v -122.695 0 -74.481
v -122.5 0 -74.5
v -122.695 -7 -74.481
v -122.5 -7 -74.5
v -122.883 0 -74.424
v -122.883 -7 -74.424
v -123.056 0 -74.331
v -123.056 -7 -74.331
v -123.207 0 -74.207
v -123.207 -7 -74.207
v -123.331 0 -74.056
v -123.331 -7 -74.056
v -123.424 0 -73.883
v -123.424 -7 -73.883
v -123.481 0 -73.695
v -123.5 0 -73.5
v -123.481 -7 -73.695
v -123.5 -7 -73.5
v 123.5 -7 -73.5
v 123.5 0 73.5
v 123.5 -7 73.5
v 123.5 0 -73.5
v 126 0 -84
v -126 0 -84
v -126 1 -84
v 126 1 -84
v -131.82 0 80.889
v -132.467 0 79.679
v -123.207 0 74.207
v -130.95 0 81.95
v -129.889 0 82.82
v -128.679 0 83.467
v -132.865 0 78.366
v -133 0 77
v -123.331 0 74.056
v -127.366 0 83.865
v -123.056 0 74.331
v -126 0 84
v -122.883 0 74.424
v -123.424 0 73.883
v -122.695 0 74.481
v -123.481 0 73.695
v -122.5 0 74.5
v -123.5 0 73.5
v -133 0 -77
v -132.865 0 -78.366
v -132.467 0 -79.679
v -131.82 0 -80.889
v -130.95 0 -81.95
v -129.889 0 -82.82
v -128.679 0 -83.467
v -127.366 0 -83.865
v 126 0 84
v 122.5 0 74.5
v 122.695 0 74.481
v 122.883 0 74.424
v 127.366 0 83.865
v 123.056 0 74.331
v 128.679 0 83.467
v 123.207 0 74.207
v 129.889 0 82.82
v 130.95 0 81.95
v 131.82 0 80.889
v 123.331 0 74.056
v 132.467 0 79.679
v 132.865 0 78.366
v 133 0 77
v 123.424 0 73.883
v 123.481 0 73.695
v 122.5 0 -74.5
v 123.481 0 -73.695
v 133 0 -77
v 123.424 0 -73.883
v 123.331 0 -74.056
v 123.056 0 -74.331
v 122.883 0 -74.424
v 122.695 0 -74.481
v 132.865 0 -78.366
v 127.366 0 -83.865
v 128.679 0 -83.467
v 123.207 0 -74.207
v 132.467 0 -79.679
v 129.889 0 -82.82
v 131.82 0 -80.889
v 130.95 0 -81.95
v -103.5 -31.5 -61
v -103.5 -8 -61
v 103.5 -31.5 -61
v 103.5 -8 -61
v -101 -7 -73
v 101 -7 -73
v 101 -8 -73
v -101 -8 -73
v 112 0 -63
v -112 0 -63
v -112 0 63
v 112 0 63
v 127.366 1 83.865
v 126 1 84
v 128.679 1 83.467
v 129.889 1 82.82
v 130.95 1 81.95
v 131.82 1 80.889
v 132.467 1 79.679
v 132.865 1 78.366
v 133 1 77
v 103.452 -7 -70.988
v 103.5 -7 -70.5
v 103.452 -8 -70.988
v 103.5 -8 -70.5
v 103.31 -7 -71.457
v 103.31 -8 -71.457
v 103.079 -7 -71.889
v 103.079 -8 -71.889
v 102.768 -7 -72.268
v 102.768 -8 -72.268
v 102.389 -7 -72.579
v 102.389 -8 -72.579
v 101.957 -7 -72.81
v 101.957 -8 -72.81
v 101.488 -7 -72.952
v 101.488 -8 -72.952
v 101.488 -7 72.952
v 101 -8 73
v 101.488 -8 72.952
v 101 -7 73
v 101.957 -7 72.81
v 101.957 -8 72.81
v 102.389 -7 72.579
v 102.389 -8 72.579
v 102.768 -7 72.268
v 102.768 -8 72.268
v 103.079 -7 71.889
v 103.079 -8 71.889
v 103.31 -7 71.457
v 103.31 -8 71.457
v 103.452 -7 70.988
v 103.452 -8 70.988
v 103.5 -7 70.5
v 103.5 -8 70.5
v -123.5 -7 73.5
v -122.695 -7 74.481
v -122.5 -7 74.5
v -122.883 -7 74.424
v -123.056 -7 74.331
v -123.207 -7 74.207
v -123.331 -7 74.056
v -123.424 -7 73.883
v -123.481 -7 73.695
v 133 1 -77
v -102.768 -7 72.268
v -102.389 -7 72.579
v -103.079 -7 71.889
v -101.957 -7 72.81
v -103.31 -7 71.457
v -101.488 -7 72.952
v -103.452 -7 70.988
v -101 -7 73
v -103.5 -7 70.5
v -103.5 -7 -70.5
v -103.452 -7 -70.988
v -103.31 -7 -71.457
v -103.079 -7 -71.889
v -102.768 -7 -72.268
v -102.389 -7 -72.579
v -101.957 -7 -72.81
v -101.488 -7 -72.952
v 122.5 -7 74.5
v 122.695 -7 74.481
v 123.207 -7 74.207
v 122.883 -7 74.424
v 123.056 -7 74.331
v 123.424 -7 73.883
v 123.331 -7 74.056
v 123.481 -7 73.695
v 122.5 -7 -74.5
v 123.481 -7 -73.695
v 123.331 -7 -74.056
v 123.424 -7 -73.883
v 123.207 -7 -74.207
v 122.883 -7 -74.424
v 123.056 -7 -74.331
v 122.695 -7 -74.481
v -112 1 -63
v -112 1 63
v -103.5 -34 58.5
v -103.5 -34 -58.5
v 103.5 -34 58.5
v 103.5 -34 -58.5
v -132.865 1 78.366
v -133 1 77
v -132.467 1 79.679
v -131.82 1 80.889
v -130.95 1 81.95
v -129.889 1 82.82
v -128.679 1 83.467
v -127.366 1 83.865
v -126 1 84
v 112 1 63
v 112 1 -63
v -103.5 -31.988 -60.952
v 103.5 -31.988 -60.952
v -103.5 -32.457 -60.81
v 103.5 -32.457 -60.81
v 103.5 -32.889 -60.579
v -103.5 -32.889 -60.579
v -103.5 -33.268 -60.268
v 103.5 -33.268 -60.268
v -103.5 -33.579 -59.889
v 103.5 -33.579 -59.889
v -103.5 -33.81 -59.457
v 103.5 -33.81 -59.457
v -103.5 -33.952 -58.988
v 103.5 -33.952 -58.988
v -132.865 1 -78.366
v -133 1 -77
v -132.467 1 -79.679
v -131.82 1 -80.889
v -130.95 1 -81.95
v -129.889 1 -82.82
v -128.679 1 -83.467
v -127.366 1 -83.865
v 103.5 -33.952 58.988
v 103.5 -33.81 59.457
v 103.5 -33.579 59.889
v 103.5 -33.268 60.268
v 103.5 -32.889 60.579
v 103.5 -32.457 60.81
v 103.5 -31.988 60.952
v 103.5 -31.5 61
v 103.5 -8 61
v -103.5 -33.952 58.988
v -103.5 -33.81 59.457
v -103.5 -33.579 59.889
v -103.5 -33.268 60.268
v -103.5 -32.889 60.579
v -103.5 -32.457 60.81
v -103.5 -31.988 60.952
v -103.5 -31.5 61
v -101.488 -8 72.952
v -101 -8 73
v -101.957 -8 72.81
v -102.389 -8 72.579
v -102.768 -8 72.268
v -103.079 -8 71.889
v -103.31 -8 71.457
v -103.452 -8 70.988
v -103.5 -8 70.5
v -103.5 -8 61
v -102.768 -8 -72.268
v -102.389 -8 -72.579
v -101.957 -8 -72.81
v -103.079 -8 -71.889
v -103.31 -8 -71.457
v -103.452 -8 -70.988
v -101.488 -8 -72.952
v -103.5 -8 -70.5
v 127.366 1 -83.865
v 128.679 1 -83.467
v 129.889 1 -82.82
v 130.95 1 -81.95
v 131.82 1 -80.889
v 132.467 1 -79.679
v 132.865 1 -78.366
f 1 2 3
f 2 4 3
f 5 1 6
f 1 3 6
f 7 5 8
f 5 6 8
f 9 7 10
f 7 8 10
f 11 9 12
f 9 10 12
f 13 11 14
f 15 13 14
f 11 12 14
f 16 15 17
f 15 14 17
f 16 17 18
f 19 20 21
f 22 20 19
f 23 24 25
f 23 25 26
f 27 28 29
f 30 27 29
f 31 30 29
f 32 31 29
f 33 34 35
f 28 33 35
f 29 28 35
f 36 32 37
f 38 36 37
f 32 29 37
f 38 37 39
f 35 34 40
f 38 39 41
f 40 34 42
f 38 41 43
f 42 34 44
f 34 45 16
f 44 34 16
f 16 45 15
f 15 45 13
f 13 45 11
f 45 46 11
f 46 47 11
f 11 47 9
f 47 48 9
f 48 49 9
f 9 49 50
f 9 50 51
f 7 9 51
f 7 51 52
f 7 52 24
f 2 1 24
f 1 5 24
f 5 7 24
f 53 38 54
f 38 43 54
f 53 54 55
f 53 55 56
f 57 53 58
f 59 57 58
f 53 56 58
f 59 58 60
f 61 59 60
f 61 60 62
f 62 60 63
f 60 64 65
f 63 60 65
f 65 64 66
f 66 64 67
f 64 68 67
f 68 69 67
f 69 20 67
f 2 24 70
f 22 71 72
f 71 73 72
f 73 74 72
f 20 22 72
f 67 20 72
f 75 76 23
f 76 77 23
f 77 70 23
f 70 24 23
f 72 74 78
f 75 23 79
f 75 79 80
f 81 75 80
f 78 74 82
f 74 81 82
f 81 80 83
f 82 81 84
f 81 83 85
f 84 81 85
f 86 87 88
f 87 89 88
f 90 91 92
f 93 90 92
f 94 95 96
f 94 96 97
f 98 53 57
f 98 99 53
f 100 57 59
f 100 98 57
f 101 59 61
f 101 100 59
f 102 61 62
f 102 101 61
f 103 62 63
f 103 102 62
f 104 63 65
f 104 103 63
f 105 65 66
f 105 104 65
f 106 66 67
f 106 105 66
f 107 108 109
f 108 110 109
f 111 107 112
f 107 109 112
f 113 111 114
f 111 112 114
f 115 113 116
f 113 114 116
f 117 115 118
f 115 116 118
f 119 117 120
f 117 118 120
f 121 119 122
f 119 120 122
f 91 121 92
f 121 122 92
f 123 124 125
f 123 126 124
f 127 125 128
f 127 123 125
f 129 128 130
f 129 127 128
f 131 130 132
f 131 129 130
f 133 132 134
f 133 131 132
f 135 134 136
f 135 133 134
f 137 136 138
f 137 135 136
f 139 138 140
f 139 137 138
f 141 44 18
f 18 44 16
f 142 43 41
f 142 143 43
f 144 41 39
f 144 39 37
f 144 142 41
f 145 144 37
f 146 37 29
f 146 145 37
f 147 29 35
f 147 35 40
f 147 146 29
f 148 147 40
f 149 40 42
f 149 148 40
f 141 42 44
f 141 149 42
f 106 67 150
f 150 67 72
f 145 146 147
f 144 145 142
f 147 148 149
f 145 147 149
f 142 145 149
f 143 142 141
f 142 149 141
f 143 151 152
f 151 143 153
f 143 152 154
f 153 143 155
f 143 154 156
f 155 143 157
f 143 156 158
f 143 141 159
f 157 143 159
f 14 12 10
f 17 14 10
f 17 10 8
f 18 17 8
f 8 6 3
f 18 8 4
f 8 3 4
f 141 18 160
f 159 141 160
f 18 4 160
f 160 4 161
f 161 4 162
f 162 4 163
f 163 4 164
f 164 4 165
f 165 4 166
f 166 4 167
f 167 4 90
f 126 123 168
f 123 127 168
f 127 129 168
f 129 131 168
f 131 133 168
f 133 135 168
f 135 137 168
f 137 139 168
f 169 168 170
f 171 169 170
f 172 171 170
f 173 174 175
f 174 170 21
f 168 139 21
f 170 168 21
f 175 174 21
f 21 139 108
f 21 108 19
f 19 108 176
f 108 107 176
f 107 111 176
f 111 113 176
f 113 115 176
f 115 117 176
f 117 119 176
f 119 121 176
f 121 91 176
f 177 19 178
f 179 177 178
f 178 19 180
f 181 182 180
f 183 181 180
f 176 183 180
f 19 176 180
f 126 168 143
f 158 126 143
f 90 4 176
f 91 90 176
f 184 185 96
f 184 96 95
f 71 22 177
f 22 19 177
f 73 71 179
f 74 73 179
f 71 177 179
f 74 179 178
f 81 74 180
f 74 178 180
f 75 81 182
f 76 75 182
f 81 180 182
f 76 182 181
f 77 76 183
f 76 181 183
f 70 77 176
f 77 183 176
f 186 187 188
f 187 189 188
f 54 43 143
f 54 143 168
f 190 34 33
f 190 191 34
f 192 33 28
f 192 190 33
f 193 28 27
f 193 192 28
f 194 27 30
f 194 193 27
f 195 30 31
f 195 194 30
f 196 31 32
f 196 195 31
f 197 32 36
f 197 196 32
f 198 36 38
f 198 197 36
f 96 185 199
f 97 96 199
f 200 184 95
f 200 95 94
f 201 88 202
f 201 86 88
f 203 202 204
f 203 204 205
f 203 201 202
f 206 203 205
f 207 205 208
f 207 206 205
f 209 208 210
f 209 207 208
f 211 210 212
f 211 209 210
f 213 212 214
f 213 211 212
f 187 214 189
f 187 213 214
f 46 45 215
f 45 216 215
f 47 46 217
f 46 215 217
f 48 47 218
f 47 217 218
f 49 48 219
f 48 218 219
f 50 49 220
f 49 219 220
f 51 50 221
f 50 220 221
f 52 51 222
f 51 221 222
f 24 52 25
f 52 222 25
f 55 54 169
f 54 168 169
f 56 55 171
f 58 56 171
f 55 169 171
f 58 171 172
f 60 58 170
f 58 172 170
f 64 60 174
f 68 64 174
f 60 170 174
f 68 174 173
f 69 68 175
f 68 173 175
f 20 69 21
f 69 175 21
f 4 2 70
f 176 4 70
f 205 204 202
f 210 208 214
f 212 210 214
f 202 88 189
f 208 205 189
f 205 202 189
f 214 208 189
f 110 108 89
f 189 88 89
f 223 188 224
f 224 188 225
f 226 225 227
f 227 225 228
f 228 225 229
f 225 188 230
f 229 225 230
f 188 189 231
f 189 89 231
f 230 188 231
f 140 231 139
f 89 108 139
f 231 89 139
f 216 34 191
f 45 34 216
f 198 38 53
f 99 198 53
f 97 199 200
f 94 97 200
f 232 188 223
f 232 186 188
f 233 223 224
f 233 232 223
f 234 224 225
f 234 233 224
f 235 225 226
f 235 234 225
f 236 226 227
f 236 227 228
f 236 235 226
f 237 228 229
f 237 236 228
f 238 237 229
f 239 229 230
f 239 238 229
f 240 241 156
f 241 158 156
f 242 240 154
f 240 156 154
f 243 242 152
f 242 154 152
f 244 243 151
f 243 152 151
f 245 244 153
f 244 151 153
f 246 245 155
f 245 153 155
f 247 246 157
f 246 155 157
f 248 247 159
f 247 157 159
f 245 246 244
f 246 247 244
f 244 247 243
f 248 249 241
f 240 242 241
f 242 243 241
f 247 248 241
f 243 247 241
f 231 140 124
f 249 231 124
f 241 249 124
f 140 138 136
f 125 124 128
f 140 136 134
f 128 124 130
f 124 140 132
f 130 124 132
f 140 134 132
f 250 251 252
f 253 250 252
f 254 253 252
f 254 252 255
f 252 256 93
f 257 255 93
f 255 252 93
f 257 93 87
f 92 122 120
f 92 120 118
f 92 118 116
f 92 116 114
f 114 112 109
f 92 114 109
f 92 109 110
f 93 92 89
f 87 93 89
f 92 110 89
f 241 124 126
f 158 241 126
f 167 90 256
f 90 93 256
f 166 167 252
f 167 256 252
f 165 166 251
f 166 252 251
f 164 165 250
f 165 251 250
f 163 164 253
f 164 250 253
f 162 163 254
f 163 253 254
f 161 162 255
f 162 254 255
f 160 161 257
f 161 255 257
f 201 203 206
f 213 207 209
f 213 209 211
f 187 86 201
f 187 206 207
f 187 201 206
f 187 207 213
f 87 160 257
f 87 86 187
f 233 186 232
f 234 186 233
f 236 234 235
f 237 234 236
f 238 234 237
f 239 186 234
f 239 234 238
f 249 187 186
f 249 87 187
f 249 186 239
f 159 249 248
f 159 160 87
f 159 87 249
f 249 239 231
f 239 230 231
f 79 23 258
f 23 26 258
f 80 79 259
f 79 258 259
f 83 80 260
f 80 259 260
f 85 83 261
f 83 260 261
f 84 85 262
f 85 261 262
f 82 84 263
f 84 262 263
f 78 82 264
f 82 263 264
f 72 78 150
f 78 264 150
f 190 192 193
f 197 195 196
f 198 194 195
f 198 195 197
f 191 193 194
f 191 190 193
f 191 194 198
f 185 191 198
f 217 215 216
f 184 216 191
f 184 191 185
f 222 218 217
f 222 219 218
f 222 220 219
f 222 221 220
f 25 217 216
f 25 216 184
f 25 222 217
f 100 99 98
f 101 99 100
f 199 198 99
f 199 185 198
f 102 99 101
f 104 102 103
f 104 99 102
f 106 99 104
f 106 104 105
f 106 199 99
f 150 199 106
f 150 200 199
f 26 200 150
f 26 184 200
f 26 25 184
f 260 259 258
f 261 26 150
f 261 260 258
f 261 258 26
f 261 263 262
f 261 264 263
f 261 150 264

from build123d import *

# Parameters (mm, degrees)
SKETCH1_W           = 266
SKETCH1_H           = 168
BOSS_EXTRUDE1_DEPTH = 1
SKETCH2_W           = 247
SKETCH2_H           = 149
BOSS_EXTRUDE2_DEPTH = 7
BOSS_EXTRUDE3_DEPTH = 103.5
FILLET1_R           = 7
FILLET2_R           = 1
FILLET3_R           = 2.5
SKETCH4_W           = 224
SKETCH4_H           = 126
CUT_EXTRUDE1_DEPTH  = 1


with BuildPart() as part:
    # Sketch1 → Boss-Extrude1 (new body)
    with BuildSketch(Plane(origin=(0, 0, 0), x_dir=(1, 0, 0), z_dir=(0, 1, 0))):
        Rectangle(SKETCH1_W, SKETCH1_H)
    extrude(amount=BOSS_EXTRUDE1_DEPTH)

    # Sketch2 → Boss-Extrude2 (add)
    with BuildSketch(Plane(origin=(0, 0, 0), x_dir=(1, 0, 0), z_dir=(0, 1, 0))):
        Rectangle(SKETCH2_W, SKETCH2_H)
    extrude(amount=-BOSS_EXTRUDE2_DEPTH)

    # Sketch3 → Boss-Extrude3 (add, symmetric)
    with BuildSketch(Plane(origin=(0, 0, 0), x_dir=(0, 0, -1), z_dir=(1, 0, 0))):
        Polygon((-73, -7), (73, -7), (73, -8), (61, -8), (61, -34), (-61, -34), (-61, -8), (-73, -8), align=None)
    extrude(amount=BOSS_EXTRUDE3_DEPTH, both=True)

    # Fillet1
    fillet1_edges = [part.edges().sort_by_distance(p)[0] for p in [
        (-133, 0.5, -84),
        (133, 0.5, -84),
        (133, 0.5, 84),
        (-133, 0.5, 84),
    ]]
    fillet(fillet1_edges, radius=FILLET1_R)

    # Fillet2
    fillet2_edges = [part.edges().sort_by_distance(p)[0] for p in [
        (-123.5, -3.5, 74.5),
        (-123.5, -3.5, -74.5),
        (123.5, -3.5, -74.5),
        (123.5, -3.5, 74.5),
    ]]
    fillet(fillet2_edges, radius=FILLET2_R)

    # Fillet3
    fillet3_edges = [part.edges().sort_by_distance(p)[0] for p in [
        (-103.5, -7.5, 73),
        (0, -34, 61),
        (0, -34, -61),
        (-103.5, -7.5, -73),
        (103.5, -7.5, 73),
        (103.5, -7.5, -73),
    ]]
    fillet(fillet3_edges, radius=FILLET3_R)

    # Sketch4 → Cut-Extrude1 (cut)
    with BuildSketch(Plane(origin=(0, 1, 0), x_dir=(1, 0, 0), z_dir=(0, 1, 0))):
        Rectangle(SKETCH4_W, SKETCH4_H)
    extrude(amount=-CUT_EXTRUDE1_DEPTH, mode=Mode.SUBTRACT)


solid = part.part
